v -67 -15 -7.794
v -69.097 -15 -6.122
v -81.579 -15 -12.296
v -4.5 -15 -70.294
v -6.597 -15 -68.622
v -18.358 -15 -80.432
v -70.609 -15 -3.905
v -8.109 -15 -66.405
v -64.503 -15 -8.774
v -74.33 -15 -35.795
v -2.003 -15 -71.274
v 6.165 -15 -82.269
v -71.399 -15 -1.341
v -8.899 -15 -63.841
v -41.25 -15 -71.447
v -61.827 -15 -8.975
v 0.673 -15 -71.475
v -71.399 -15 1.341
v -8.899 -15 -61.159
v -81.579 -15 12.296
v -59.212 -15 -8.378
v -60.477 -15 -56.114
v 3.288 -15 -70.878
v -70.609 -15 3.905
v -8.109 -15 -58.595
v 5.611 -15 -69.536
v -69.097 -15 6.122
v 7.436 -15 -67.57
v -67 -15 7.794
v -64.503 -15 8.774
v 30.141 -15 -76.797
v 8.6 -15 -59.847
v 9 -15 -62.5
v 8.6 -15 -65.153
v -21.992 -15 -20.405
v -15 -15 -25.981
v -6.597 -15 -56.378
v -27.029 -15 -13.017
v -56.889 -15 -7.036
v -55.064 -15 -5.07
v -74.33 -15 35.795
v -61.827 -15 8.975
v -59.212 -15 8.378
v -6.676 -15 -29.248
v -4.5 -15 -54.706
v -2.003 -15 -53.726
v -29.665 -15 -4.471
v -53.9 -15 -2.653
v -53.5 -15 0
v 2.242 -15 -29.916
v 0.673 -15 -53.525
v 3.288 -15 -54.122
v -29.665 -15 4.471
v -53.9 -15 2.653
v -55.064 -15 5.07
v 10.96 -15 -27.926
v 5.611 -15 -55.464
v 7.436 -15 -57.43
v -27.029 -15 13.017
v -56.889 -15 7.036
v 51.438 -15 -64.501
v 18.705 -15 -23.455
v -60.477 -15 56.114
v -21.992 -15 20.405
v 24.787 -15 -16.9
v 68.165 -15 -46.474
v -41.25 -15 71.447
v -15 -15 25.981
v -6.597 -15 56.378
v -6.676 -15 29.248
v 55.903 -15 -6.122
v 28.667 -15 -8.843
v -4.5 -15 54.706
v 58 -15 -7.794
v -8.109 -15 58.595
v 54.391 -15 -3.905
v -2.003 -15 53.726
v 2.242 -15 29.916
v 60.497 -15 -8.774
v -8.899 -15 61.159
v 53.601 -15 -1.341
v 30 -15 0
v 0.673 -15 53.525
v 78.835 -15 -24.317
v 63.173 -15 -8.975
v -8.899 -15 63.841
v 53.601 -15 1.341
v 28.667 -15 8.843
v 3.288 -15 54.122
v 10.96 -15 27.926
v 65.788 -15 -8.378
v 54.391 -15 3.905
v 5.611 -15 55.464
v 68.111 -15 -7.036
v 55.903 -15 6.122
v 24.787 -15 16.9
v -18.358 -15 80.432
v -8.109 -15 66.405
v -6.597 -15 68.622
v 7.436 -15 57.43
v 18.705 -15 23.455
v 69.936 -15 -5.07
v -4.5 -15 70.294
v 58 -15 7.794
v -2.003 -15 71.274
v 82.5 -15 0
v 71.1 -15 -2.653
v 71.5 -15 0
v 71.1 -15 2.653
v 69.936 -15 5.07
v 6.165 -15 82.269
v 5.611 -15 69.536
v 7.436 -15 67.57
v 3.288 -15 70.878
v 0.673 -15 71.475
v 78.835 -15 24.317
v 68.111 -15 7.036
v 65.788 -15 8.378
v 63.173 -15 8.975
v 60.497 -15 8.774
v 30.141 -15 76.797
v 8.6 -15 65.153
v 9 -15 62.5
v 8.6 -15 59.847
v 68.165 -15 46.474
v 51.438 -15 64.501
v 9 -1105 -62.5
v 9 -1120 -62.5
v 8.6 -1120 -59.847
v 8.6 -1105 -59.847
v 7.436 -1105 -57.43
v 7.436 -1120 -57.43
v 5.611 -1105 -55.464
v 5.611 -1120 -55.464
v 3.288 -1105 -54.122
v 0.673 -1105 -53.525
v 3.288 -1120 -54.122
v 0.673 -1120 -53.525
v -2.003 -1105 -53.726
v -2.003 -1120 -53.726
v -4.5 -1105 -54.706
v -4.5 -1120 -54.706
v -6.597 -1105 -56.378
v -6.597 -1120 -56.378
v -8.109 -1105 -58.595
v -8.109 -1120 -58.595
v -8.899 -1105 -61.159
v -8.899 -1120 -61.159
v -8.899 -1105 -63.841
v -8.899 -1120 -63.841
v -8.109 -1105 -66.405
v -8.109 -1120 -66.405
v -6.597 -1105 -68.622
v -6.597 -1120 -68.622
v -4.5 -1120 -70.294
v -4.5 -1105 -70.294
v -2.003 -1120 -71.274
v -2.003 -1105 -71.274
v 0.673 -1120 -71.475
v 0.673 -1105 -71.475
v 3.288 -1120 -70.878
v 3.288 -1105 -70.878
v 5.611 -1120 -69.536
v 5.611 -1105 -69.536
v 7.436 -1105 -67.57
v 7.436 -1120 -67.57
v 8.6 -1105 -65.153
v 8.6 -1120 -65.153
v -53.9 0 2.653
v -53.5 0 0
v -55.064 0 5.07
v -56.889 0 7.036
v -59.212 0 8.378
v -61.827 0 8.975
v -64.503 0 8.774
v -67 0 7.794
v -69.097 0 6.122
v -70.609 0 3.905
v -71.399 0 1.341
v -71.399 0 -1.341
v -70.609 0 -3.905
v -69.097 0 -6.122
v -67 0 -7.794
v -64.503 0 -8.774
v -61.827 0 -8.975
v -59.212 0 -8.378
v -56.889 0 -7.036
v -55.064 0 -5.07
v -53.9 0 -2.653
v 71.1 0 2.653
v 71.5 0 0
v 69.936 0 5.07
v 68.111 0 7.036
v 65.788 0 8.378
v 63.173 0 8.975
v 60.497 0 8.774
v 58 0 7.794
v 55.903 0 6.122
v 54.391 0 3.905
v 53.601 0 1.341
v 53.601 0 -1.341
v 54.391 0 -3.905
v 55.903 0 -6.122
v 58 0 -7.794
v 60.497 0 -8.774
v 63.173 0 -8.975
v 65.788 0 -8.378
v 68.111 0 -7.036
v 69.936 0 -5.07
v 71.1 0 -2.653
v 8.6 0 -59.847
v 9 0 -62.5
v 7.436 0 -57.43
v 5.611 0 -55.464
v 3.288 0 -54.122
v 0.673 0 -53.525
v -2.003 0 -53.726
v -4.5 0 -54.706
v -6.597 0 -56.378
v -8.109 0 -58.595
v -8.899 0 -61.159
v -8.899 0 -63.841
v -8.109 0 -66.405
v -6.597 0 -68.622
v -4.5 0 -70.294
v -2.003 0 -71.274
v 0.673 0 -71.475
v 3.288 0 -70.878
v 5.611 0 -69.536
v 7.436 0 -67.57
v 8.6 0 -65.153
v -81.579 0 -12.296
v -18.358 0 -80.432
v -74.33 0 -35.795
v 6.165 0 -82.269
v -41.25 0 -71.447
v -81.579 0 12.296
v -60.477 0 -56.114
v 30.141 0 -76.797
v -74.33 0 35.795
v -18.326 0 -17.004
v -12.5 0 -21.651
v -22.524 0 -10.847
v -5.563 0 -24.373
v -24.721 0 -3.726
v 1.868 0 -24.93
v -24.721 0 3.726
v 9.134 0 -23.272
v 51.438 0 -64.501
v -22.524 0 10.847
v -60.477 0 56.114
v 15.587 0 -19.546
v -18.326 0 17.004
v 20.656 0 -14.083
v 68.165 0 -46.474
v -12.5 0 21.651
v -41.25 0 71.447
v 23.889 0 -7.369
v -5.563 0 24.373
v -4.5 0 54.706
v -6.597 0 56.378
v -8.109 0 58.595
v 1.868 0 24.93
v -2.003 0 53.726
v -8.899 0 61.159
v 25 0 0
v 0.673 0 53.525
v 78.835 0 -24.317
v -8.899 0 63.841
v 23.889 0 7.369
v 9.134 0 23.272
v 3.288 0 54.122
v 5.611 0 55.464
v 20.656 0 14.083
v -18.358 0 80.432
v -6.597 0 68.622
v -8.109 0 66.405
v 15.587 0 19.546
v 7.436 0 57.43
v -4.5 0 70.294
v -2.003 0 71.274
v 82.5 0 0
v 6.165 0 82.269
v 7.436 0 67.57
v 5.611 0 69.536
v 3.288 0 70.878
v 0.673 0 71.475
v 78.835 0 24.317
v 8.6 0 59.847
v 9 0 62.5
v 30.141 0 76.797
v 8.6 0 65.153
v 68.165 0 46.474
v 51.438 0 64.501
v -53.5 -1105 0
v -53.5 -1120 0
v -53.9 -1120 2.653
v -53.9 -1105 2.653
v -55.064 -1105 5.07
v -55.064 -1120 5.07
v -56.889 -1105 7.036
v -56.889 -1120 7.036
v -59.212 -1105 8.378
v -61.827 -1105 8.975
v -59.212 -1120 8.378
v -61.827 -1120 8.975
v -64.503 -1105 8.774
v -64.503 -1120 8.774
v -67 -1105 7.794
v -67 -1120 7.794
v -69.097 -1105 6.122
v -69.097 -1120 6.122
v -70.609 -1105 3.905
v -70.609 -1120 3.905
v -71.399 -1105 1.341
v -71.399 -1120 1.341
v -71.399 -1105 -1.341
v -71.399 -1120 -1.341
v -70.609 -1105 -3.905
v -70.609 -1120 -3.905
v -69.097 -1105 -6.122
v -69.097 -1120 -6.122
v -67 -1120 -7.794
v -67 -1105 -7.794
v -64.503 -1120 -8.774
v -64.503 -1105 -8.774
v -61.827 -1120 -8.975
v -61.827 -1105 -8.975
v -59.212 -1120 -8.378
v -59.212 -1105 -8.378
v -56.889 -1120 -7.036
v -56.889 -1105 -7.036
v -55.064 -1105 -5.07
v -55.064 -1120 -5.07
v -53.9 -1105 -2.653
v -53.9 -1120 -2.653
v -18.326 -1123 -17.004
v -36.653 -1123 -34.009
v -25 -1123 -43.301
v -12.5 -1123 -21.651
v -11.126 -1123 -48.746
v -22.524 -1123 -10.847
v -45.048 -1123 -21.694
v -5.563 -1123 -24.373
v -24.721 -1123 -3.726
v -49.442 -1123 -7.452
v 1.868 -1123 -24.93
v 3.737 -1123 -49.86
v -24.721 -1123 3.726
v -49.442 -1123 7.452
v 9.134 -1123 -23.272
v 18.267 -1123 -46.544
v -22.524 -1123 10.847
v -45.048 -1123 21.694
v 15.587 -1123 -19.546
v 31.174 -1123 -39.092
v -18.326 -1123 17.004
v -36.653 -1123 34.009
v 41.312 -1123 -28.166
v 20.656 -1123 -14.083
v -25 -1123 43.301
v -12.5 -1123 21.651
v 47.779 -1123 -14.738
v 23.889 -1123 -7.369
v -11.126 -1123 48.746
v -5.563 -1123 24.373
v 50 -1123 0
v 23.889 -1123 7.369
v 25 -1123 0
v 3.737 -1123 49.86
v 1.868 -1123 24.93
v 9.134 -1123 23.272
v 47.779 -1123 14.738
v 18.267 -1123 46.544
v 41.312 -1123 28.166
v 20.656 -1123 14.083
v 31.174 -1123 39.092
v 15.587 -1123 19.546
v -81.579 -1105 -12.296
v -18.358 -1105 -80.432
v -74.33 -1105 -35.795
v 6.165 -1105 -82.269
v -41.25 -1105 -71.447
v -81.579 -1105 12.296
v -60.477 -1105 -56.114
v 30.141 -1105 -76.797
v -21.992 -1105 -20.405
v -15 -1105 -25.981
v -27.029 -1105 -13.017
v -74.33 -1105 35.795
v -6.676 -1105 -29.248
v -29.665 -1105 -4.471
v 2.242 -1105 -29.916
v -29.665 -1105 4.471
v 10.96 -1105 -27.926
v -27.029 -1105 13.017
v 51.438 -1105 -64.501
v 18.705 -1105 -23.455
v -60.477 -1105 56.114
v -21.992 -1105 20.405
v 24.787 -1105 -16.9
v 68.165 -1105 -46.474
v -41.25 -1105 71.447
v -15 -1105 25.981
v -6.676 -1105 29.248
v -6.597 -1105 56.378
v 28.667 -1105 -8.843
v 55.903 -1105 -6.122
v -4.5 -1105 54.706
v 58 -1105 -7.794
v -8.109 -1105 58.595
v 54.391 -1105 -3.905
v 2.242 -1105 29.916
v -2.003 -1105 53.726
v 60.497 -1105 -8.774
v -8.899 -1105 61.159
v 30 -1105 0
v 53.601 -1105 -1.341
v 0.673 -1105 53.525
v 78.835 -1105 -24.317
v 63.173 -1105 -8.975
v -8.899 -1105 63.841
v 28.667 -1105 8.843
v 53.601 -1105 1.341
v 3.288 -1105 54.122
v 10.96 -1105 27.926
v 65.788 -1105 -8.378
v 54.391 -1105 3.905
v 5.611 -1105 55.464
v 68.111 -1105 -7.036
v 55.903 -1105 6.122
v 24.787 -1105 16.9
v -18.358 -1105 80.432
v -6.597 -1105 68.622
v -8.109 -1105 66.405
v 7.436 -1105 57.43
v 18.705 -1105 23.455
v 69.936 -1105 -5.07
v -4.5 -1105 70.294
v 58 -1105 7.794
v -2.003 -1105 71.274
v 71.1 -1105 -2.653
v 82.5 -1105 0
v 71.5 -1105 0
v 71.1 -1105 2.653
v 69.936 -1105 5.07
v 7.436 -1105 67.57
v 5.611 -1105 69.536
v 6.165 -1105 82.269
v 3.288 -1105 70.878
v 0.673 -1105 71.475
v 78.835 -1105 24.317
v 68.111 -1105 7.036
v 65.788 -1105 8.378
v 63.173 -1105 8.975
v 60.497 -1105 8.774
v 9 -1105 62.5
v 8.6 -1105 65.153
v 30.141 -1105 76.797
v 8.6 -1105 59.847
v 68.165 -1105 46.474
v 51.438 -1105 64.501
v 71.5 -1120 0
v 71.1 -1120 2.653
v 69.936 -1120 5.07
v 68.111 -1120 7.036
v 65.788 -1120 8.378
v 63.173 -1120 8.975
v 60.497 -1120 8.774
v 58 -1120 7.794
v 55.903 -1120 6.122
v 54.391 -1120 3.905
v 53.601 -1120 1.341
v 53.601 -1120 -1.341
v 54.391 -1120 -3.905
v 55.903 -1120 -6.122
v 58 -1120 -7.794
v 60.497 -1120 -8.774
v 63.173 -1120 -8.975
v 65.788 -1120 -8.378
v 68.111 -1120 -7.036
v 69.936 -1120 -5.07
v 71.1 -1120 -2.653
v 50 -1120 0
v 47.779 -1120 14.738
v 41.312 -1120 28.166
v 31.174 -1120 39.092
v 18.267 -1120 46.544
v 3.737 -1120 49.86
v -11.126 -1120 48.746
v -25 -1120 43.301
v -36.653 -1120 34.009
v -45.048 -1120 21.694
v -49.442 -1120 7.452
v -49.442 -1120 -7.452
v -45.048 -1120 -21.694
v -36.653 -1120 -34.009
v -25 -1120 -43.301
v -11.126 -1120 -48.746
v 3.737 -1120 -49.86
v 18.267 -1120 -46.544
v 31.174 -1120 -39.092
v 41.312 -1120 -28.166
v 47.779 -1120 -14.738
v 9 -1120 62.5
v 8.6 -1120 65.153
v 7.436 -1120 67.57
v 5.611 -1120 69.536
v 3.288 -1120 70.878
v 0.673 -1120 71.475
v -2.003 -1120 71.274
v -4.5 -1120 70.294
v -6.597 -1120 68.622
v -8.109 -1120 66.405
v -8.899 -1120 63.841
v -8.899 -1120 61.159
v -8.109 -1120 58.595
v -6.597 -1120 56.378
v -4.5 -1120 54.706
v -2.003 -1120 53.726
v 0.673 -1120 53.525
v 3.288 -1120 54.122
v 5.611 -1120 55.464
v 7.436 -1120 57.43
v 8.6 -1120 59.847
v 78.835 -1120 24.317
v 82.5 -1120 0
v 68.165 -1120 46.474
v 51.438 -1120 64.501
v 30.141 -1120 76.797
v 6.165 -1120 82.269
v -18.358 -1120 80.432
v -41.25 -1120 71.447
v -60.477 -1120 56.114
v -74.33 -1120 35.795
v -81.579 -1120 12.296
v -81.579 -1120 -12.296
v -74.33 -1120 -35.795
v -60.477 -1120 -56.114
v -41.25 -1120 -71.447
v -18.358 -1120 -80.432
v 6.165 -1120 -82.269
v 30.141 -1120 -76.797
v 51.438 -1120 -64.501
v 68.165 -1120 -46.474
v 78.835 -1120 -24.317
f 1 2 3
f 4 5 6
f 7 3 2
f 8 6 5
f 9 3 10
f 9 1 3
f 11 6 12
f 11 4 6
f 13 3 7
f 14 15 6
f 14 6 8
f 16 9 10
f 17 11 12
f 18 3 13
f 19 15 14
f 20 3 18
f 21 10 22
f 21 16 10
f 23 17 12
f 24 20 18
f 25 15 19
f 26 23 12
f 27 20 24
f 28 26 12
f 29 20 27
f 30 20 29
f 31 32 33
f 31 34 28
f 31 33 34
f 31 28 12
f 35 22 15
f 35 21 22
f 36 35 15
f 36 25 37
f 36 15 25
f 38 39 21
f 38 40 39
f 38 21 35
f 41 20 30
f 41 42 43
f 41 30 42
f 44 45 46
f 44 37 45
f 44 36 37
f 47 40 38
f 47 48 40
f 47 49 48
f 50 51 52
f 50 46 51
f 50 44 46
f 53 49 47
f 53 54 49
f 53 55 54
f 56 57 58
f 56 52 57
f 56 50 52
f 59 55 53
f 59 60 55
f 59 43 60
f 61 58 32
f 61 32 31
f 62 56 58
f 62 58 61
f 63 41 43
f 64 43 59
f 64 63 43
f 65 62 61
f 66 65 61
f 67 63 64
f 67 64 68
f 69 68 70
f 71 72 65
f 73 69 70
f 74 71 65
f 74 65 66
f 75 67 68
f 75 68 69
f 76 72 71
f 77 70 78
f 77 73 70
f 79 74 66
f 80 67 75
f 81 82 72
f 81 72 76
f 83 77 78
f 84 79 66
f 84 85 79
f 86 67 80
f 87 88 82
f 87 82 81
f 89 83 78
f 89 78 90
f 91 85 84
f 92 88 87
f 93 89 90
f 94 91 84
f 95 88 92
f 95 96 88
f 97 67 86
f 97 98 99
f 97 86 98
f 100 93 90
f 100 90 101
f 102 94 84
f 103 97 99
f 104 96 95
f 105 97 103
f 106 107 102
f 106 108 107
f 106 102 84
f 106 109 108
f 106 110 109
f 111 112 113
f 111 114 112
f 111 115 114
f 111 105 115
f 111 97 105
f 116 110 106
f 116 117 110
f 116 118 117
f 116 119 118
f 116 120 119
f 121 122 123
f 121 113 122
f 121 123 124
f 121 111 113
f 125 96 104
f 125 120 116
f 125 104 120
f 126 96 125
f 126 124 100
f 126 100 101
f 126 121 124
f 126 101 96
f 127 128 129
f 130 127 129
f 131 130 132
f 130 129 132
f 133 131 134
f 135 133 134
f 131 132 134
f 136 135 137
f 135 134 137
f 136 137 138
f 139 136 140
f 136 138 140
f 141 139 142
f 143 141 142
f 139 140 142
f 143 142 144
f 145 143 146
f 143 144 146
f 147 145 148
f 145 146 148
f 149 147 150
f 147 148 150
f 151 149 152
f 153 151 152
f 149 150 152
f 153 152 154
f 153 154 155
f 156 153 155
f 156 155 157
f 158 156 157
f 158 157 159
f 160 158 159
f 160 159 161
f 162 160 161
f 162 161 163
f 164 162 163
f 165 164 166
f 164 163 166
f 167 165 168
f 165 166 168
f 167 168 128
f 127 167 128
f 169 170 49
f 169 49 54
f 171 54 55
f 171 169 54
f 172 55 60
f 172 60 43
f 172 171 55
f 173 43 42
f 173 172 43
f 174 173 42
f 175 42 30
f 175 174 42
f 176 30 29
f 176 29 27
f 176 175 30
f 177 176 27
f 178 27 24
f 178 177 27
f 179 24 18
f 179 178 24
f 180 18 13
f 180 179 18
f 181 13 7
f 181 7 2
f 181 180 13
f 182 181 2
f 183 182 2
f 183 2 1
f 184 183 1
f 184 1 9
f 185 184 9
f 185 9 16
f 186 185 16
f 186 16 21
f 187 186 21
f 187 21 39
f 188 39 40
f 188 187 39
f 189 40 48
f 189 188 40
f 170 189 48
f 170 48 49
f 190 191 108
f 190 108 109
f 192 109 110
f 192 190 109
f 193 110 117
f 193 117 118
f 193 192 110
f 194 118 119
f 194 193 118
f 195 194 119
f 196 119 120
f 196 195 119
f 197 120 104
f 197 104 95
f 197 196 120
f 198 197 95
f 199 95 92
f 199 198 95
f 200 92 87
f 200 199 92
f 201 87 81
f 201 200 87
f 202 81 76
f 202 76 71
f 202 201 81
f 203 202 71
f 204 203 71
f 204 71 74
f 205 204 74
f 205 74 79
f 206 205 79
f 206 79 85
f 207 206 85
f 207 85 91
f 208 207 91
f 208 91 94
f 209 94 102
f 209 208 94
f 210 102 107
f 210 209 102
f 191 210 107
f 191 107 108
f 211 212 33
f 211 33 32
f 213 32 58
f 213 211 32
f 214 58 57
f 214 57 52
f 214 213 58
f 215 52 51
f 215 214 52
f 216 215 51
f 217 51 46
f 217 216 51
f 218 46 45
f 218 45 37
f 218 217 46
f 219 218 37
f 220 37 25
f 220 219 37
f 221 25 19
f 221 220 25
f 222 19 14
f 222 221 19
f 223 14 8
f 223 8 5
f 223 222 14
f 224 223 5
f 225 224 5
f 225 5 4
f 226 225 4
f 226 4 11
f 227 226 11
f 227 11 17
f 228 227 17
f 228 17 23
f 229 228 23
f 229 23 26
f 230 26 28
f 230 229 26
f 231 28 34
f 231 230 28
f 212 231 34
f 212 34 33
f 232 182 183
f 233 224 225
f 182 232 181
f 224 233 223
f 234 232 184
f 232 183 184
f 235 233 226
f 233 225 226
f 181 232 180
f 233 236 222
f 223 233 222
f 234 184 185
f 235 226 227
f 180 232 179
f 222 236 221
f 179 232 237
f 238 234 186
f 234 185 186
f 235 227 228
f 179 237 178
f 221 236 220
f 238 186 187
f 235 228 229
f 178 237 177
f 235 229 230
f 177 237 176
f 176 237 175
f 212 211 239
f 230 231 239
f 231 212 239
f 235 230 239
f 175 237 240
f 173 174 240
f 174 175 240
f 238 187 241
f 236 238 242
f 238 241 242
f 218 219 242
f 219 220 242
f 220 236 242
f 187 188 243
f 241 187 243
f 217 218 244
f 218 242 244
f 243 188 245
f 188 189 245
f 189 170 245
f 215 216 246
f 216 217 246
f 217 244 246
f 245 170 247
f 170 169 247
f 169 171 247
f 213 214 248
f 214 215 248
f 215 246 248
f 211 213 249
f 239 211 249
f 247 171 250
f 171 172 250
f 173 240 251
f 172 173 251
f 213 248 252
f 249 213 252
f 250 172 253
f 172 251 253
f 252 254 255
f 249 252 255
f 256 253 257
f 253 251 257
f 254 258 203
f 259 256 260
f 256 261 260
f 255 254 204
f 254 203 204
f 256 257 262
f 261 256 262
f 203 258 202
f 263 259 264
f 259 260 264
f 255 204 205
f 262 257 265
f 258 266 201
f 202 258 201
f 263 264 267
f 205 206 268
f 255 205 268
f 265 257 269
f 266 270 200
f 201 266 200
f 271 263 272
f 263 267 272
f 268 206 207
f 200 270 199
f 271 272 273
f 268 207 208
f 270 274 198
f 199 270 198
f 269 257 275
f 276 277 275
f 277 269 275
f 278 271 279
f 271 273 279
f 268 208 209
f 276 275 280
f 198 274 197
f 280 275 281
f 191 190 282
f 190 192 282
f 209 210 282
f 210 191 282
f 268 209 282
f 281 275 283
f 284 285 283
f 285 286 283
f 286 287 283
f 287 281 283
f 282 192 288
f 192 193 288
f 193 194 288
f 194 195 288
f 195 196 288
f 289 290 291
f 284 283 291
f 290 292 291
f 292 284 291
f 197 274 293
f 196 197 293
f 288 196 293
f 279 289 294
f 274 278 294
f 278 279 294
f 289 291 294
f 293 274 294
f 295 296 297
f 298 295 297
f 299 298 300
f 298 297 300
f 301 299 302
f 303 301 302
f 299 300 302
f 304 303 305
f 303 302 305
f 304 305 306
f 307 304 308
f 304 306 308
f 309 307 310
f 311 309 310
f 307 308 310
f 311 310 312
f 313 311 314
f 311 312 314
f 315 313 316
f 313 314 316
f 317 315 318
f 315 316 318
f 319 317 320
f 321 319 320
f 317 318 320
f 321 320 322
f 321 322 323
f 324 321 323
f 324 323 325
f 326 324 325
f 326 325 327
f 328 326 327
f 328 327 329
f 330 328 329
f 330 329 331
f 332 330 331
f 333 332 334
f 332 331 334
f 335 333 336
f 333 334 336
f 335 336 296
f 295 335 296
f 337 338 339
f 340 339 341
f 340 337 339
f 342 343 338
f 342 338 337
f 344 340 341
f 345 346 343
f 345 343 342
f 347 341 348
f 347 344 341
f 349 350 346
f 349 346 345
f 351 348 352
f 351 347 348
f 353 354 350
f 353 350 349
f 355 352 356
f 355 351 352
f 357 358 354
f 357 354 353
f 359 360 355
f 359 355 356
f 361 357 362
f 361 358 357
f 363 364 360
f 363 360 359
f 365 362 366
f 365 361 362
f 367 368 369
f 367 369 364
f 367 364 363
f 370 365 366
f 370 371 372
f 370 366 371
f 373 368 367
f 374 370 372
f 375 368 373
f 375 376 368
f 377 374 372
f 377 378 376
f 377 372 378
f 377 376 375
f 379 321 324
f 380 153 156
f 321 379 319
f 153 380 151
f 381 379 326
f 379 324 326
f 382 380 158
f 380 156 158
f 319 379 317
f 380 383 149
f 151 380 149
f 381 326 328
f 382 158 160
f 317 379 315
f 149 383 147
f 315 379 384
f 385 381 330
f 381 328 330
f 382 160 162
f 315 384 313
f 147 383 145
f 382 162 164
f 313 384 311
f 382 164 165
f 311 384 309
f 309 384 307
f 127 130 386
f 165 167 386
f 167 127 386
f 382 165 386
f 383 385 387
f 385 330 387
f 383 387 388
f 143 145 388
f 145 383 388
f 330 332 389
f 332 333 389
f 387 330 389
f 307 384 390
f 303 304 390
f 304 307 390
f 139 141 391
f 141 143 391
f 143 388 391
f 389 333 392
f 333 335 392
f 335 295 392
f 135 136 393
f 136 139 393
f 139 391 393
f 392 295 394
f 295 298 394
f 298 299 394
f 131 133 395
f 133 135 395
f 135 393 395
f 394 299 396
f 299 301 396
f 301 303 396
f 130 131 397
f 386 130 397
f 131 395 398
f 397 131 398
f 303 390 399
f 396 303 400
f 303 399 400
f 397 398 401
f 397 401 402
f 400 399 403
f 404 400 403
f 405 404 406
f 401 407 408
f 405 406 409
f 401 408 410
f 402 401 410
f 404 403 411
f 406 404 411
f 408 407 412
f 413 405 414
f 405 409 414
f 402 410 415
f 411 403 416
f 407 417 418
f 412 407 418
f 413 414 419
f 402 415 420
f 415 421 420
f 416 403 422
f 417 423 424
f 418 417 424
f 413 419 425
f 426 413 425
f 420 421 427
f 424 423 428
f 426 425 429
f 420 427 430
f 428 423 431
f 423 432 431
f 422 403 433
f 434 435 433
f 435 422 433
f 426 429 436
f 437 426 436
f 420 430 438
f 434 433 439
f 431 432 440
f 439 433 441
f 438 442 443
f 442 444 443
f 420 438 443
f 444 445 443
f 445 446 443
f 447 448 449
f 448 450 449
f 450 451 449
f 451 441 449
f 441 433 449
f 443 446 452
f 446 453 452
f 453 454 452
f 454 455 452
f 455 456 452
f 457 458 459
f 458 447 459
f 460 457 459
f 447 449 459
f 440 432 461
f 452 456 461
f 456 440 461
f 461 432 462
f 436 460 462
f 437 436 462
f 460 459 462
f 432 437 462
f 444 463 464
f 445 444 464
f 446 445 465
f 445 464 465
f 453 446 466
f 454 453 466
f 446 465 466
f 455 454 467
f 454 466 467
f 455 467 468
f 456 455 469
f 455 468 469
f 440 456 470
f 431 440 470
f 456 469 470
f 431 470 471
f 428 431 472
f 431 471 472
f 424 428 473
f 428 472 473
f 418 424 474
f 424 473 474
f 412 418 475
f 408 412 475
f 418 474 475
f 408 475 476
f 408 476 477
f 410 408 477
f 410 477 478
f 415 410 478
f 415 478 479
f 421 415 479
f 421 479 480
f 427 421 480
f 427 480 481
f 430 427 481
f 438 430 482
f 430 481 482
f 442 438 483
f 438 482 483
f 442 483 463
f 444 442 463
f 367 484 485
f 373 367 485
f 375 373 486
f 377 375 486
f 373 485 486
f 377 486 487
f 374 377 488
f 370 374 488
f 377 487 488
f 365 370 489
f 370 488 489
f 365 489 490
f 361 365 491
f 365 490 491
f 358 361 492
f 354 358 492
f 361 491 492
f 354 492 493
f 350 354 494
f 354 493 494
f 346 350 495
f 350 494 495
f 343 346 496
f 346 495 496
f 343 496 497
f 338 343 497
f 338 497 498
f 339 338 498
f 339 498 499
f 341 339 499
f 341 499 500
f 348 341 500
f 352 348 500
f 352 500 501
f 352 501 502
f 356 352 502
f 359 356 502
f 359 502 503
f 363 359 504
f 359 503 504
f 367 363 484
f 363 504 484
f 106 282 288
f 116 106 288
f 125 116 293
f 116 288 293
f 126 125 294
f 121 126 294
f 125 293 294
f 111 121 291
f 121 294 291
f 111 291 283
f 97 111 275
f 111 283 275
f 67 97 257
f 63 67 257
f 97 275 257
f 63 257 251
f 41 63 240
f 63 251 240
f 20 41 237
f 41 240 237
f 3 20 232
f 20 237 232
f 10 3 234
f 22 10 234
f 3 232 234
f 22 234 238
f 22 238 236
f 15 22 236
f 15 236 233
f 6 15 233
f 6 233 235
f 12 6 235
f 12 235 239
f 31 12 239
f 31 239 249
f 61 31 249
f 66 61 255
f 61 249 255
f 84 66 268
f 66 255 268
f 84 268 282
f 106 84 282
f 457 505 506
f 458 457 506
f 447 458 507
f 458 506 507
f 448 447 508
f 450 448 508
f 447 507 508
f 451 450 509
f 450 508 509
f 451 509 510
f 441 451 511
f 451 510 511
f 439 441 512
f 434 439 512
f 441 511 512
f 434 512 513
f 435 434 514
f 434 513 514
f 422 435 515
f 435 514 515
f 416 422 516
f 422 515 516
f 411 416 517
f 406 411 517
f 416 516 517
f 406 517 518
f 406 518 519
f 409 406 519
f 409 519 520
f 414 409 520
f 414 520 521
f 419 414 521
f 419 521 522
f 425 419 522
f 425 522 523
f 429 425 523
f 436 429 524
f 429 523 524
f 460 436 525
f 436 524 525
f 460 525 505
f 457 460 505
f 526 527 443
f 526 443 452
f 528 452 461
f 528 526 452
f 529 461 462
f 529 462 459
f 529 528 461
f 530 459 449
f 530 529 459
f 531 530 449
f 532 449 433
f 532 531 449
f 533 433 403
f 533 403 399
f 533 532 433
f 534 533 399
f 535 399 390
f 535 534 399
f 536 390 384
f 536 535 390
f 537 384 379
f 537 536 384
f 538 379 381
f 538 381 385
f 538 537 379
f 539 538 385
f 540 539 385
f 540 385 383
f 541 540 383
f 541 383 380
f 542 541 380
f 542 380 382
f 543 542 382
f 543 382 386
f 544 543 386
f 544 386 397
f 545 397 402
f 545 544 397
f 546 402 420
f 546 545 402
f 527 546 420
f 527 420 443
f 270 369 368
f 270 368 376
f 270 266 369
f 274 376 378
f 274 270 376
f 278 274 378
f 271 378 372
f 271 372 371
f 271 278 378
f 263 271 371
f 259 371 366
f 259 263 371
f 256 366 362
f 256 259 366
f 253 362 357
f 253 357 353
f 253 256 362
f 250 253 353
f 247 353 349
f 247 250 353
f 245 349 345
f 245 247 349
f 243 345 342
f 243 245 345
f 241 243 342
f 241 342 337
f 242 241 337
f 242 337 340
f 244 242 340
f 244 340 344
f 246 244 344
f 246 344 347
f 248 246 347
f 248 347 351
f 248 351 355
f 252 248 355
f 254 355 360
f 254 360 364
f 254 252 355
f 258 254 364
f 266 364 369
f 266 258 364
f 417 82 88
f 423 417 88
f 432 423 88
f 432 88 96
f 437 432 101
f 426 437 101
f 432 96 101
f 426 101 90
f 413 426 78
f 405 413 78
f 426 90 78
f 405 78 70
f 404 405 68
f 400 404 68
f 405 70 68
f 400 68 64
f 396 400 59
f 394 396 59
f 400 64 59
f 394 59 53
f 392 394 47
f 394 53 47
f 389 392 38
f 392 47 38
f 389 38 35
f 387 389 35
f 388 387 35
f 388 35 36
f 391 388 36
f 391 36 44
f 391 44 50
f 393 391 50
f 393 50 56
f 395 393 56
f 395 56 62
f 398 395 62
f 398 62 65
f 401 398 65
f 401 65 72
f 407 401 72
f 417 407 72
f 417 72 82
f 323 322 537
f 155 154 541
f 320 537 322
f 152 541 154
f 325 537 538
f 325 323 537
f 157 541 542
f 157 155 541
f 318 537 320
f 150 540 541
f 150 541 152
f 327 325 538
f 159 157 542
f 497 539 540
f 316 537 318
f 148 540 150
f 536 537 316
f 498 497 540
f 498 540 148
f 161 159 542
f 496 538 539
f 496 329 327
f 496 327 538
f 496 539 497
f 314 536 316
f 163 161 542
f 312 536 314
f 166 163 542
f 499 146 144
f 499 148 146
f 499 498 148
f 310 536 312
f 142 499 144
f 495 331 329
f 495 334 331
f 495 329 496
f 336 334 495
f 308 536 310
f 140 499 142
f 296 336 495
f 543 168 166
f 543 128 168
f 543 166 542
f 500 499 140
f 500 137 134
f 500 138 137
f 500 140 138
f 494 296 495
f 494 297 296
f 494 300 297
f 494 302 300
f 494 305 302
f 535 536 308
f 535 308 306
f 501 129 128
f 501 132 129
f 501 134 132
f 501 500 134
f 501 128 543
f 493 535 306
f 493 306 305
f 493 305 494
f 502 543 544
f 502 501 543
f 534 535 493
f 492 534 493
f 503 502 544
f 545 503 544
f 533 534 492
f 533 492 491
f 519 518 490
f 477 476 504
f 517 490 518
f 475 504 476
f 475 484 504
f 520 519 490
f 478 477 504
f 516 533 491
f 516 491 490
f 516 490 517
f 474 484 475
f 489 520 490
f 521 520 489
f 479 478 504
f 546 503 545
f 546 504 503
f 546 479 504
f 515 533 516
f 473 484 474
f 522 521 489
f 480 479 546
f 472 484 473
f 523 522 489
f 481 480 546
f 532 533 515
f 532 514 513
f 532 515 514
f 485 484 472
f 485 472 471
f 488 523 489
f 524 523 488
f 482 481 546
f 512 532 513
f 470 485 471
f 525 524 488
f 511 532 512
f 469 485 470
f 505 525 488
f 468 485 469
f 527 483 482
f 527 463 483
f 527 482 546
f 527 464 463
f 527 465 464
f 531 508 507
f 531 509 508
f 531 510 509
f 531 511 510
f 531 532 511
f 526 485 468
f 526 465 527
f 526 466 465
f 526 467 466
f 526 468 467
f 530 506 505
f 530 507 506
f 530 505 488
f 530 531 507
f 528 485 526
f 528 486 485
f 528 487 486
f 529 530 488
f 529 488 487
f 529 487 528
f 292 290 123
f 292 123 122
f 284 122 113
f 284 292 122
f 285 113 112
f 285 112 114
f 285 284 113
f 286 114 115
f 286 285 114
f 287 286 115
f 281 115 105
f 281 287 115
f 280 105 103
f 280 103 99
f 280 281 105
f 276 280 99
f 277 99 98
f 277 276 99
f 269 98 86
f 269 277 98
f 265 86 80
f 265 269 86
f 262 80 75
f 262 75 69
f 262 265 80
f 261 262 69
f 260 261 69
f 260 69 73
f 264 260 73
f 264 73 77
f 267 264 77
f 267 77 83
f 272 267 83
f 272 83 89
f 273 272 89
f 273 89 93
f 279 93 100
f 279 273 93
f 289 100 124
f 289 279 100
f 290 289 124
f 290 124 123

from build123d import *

# Parameters (mm, degrees)
F0_R     = 30
F0_R_2   = 25
F1_DEPTH = 1120
F0_R_3   = 82.5
F0_R_4   = 9
F2_DEPTH = 15
F3_R     = 82.5
F3_R_2   = 9
F3_R_3   = 30
F4_DEPTH = 15
F5_R     = 50
F5_R_2   = 25
F6_DEPTH = 3


with BuildPart() as f1:
    # F0 (on Front) → F1 (new body)
    with BuildSketch(Plane.XZ):
        Circle(F0_R)
        Circle(F0_R_2, mode=Mode.SUBTRACT)
    extrude(amount=F1_DEPTH)

    # F0 (on Front) → F2 (join)
    with BuildSketch(Plane.XZ):
        Circle(F0_R_3)
        with Locations((0, -62.5)):
            Circle(F0_R_4, mode=Mode.SUBTRACT)
        with Locations((-62.5, 0)):
            Circle(F0_R_4, mode=Mode.SUBTRACT)
        Circle(F0_R, mode=Mode.SUBTRACT)
        with Locations((62.5, 0)):
            Circle(F0_R_4, mode=Mode.SUBTRACT)
        with Locations((0, 62.5)):
            Circle(F0_R_4, mode=Mode.SUBTRACT)
    extrude(amount=F2_DEPTH)

    # F3 (on face) → F4 (join)
    with BuildSketch(Plane.XZ.offset(1120)):
        Circle(F3_R)
        with Locations((0, -62.5)):
            Circle(F3_R_2, mode=Mode.SUBTRACT)
        with Locations((-62.5, 0)):
            Circle(F3_R_2, mode=Mode.SUBTRACT)
        Circle(F3_R_3, mode=Mode.SUBTRACT)
        with Locations((62.5, 0)):
            Circle(F3_R_2, mode=Mode.SUBTRACT)
        with Locations((0, 62.5)):
            Circle(F3_R_2, mode=Mode.SUBTRACT)
    extrude(amount=-F4_DEPTH)

    # F5 (on face) → F6 (join)
    with BuildSketch(Plane.XZ.offset(1120)):
        Circle(F5_R)
        Circle(F5_R_2, mode=Mode.SUBTRACT)
    extrude(amount=F6_DEPTH)


solid = f1.part
